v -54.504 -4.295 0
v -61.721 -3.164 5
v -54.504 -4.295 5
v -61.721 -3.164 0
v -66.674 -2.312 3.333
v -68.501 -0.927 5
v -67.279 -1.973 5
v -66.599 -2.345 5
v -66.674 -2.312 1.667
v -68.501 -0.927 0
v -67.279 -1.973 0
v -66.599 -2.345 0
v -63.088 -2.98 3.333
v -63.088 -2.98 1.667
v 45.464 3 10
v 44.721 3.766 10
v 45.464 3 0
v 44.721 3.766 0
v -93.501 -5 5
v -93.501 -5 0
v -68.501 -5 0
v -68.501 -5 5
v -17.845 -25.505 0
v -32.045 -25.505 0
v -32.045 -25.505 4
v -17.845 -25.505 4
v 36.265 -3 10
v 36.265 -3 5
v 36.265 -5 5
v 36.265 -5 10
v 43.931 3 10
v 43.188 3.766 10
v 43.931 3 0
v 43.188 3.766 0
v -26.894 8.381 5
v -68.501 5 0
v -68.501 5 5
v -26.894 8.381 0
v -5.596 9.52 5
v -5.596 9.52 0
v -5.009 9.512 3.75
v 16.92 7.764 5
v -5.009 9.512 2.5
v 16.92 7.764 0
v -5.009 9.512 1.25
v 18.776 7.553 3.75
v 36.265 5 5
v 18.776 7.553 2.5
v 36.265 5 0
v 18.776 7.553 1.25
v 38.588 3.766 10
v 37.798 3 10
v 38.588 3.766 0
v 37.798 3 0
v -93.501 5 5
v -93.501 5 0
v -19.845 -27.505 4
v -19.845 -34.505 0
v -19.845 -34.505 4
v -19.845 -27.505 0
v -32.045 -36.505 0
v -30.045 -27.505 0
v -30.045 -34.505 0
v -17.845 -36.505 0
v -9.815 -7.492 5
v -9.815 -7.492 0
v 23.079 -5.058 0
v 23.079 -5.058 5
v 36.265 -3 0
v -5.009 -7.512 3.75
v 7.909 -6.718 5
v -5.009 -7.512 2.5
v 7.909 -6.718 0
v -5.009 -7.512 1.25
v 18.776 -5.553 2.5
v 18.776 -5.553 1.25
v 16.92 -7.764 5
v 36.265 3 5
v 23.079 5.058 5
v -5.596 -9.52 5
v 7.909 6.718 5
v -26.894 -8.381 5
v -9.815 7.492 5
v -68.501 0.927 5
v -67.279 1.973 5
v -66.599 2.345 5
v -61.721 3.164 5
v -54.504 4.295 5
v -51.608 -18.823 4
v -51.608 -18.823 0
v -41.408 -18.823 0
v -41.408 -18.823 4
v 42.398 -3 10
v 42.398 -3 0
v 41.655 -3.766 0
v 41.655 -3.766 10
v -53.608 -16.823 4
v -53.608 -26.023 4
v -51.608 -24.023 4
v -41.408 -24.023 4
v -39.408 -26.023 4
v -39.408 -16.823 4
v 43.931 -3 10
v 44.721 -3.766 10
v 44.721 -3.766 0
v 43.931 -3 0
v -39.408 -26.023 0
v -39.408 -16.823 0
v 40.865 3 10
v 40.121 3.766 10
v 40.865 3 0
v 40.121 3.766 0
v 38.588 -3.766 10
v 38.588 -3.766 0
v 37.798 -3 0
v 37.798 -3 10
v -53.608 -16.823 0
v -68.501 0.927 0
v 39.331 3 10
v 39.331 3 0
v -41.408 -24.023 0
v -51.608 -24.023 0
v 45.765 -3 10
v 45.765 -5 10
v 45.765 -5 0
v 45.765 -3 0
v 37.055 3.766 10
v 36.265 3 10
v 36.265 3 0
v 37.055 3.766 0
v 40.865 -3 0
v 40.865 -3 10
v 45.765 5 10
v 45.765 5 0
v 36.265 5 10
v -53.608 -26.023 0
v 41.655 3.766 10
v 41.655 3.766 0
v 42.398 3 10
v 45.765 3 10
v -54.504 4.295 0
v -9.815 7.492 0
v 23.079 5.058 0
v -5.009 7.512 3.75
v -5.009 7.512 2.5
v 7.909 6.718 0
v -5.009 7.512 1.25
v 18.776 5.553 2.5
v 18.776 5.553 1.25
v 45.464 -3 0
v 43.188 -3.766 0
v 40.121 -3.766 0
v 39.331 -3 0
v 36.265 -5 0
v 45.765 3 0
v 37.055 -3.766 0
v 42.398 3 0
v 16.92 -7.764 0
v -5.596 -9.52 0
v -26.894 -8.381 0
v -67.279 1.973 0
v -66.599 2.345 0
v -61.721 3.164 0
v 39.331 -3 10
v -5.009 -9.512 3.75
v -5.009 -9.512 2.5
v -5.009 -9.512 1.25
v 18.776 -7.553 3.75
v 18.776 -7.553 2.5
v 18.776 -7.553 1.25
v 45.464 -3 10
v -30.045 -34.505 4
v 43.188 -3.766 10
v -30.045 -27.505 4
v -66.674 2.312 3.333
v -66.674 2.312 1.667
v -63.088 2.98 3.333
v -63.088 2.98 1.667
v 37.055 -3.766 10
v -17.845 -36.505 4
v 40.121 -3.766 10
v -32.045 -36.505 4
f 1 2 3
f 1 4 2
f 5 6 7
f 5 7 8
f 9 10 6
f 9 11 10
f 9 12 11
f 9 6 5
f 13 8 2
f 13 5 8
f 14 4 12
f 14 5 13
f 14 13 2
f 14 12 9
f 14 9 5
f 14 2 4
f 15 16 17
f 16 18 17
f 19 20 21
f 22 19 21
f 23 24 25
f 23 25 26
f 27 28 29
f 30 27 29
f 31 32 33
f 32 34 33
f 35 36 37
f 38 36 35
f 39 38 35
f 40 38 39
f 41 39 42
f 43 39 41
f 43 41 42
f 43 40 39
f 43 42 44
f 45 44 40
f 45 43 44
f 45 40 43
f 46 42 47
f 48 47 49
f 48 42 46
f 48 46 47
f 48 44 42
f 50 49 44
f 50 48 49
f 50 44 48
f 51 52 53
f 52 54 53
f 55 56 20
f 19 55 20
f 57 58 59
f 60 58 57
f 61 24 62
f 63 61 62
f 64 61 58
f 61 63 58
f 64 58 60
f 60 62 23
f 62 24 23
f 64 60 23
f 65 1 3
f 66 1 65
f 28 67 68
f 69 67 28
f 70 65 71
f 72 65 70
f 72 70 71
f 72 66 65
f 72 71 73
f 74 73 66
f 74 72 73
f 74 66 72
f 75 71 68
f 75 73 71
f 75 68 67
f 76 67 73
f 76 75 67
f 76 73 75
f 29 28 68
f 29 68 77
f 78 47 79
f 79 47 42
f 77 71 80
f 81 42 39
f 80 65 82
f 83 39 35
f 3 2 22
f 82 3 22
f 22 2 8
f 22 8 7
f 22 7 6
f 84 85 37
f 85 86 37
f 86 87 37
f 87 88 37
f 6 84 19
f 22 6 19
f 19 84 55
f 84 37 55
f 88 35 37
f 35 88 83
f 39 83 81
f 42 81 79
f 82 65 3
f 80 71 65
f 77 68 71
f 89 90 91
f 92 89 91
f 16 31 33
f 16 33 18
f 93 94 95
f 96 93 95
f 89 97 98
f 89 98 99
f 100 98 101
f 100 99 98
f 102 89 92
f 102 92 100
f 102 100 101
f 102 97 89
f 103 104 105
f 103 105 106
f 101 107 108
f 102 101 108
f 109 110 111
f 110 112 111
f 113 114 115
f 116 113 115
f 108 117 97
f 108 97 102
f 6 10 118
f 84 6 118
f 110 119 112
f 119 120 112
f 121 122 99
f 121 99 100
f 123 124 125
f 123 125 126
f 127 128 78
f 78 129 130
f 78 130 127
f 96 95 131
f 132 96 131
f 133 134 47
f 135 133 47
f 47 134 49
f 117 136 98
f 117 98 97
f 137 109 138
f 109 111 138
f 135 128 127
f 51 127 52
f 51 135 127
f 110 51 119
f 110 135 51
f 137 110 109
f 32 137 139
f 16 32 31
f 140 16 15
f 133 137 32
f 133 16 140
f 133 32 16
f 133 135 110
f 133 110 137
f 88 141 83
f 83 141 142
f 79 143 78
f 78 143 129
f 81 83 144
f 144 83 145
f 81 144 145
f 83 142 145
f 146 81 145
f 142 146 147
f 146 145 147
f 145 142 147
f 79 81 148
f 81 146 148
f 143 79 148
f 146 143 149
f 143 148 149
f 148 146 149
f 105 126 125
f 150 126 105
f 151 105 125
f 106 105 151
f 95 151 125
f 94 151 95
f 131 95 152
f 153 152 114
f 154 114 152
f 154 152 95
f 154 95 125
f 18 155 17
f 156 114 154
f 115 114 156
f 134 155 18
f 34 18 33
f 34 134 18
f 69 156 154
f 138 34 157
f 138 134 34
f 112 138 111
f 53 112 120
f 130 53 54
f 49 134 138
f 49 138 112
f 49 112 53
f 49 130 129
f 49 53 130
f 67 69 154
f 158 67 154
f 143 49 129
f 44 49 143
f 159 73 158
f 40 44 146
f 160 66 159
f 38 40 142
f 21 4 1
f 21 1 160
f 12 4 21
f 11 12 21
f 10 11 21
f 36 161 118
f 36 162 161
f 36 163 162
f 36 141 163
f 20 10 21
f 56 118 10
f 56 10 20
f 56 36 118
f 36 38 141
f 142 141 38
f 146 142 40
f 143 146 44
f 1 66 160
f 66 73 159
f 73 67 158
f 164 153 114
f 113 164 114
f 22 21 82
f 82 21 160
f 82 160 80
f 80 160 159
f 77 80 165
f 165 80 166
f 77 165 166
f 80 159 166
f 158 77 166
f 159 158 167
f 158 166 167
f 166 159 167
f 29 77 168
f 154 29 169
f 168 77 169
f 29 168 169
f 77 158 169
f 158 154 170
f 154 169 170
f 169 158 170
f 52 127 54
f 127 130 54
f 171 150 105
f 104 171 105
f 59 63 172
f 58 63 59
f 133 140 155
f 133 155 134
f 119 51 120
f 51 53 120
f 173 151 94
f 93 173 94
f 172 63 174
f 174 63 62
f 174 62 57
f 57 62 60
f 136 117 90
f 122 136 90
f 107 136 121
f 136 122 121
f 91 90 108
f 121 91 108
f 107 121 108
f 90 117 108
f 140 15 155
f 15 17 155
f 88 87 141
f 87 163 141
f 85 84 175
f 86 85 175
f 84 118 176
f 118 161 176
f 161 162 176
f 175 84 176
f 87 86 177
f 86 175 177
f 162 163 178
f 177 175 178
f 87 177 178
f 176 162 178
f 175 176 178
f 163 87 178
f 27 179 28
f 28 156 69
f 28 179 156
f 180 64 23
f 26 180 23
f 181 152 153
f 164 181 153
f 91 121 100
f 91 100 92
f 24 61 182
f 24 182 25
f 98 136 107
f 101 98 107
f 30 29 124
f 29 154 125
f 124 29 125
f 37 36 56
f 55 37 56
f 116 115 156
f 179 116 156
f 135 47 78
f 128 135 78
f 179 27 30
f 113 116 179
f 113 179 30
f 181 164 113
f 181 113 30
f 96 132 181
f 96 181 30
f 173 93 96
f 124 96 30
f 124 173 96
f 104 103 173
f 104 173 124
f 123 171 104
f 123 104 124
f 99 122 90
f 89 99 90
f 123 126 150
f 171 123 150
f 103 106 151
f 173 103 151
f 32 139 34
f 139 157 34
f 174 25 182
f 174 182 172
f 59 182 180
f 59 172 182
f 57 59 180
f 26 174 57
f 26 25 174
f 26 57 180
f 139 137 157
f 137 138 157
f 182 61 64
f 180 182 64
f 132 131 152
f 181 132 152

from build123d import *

# Parameters (mm, degrees)
F1_DEPTH = 5
F2_W     = 14.2
F2_H     = 9.2
F2_W_2   = 10.2
F2_H_2   = 5.2
F3_DEPTH = 4
F2_H_3   = 11
F2_H_4   = 7
F5_DEPTH = 5


with BuildPart() as f1:
    # F0 (on Top) → F1 (new body)
    with BuildSketch(Plane.XY):
        with BuildLine():
            add(Edge.make_bspline(
                [(-68.500610282, 5), (-54.2031592123, 6.498236069), (-28.9568536919, 8.0169149267), (-5.690111388, 10.3538383758), (18.7019701535, 7.5542384302), (30.7361740896, 6.1988411601), (36.2649820745, 5)],
                knots=[0, 0, 0, 0, 0.3124026076, 0.5516971774, 0.7926463097, 1, 1, 1, 1], degree=3))
            Line((-68.500610282, 5), (-93.500610282, 5))
            Line((-93.500610282, 5), (-93.500610282, -5))
            Line((-93.500610282, -5), (-68.500610282, -5))
            add(Edge.make_bspline(
                [(-68.500610282, -5), (-54.2031592123, -6.498236069), (-28.9568536919, -8.0169149267), (-5.690111388, -10.3538383758), (18.7019701535, -7.5542384302), (30.7361740896, -6.1988411601), (36.2649820745, -5)],
                knots=[0, 0, 0, 0, 0.3124026076, 0.5516971774, 0.7926463097, 1, 1, 1, 1], degree=3))
            Line((36.2649820745, -5), (45.7649820745, -5))
            Line((45.7649820745, -5), (45.7649820745, -3))
            Line((45.7649820745, -3), (45.4640649259, -3))
            Line((45.4640649259, -3), (44.7209854505, -3.7662296239))
            Line((44.7209854505, -3.7662296239), (43.9308844507, -3))
            Line((43.9308844507, -3), (43.1878049753, -3.7662296239))
            Line((43.1878049753, -3.7662296239), (42.3977039754, -3))
            Line((42.3977039754, -3), (41.6546245001, -3.7662296239))
            Line((41.6546245001, -3.7662296239), (40.8645235002, -3))
            Line((40.8645235002, -3), (40.1214440248, -3.7662296239))
            Line((40.1214440248, -3.7662296239), (39.331343025, -3))
            Line((39.331343025, -3), (38.5882635496, -3.7662296239))
            Line((38.5882635496, -3.7662296239), (37.7981625497, -3))
            Line((37.7981625497, -3), (37.0550830744, -3.7662296239))
            Line((37.0550830744, -3.7662296239), (36.2649820745, -3))
            add(Edge.make_bspline(
                [(-54.5035110722, -4.2945796628), (-45.1174188085, -5.0673920481), (-25.942247112, -6.3197035472), (-5.690111388, -8.3538383758), (18.7019701535, -5.5542384302), (30.7361740896, -4.1988411601), (36.2649820745, -3)],
                knots=[0.1027009604, 0.1027009604, 0.1027009604, 0.1027009604, 0.3124026076, 0.5516971774, 0.7926463097, 1, 1, 1, 1], degree=3))
            add(Edge.make_bspline(
                [(-68.500610282, -0.9273324395), (-67.9470667678, -1.4571608606), (-66.6954203062, -2.6607387972), (-62.7879440715, -2.9097150623), (-57.6365610628, -3.8172235663), (-54.5035110722, -4.2945796628)],
                knots=[0, 0, 0, 0, 0.23763899, 0.5374337196, 1, 1, 1, 1], degree=3))
            Line((-68.500610282, -0.9273324395), (-68.500610282, 0.9273324395))
            add(Edge.make_bspline(
                [(-68.500610282, 0.9273324395), (-67.9470667678, 1.4571608606), (-66.6954203062, 2.6607387972), (-62.7879440715, 2.9097150623), (-57.6365610628, 3.8172235663), (-54.5035110722, 4.2945796628)],
                knots=[0, 0, 0, 0, 0.23763899, 0.5374337196, 1, 1, 1, 1], degree=3))
            add(Edge.make_bspline(
                [(-54.5035110722, 4.2945796628), (-45.1174188085, 5.0673920481), (-25.942247112, 6.3197035472), (-5.690111388, 8.3538383758), (18.7019701535, 5.5542384302), (30.7361740896, 4.1988411601), (36.2649820745, 3)],
                knots=[0.1027009604, 0.1027009604, 0.1027009604, 0.1027009604, 0.3124026076, 0.5516971774, 0.7926463097, 1, 1, 1, 1], degree=3))
            Line((36.2649820745, 3), (37.0550830744, 3.7662296239))
            Line((37.0550830744, 3.7662296239), (37.7981625497, 3))
            Line((37.7981625497, 3), (38.5882635496, 3.7662296239))
            Line((38.5882635496, 3.7662296239), (39.331343025, 3))
            Line((39.331343025, 3), (40.1214440248, 3.7662296239))
            Line((40.1214440248, 3.7662296239), (40.8645235002, 3))
            Line((40.8645235002, 3), (41.6546245001, 3.7662296239))
            Line((41.6546245001, 3.7662296239), (42.3977039754, 3))
            Line((42.3977039754, 3), (43.1878049753, 3.7662296239))
            Line((43.1878049753, 3.7662296239), (43.9308844507, 3))
            Line((43.9308844507, 3), (44.7209854505, 3.7662296239))
            Line((44.7209854505, 3.7662296239), (45.4640649259, 3))
            Line((45.4640649259, 3), (45.7649820745, 3))
            Line((45.7649820745, 3), (45.7649820745, 5))
            Line((45.7649820745, 5), (36.2649820745, 5))
        make_face()
    extrude(amount=F1_DEPTH)

    # F4 (on face) → F5 (join)
    with BuildSketch(Plane.XY.offset(5)):
        Polygon((36.2649820745, 5), (36.2649820745, 3), (37.0550830744, 3.7662296239), (37.7981625497, 3), (38.5882635496, 3.7662296239), (39.331343025, 3), (40.1214440248, 3.7662296239), (40.8645235002, 3), (41.6546245001, 3.7662296239), (42.3977039754, 3), (43.1878049753, 3.7662296239), (43.9308844507, 3), (44.7209854505, 3.7662296239), (45.4640649259, 3), (45.7649820745, 3), (45.7649820745, 5), align=None)
        Polygon((37.0550830744, -3.7662296239), (36.2649820745, -3), (36.2649820745, -5), (45.7649820745, -5), (45.7649820745, -3), (45.4640649259, -3), (44.7209854505, -3.7662296239), (43.9308844507, -3), (43.1878049753, -3.7662296239), (42.3977039754, -3), (41.6546245001, -3.7662296239), (40.8645235002, -3), (40.1214440248, -3.7662296239), (39.331343025, -3), (38.5882635496, -3.7662296239), (37.7981625497, -3), align=None)
    extrude(amount=F5_DEPTH)


with BuildPart() as f3:
    # F2 (on Top) → F3 (new body)
    with BuildSketch(Plane.XY):
        with Locations((-46.5084100604, -21.4228421539)):
            Rectangle(F2_W, F2_H)
        with Locations((-46.5084100604, -21.4228421539)):
            Rectangle(F2_W_2, F2_H_2, mode=Mode.SUBTRACT)
    extrude(amount=F3_DEPTH)


with BuildPart() as f3b:
    # F2 (on Top) → F3, piece 2 (new body)
    with BuildSketch(Plane.XY):
        with Locations((-24.9447634608, -31.0053733885)):
            Rectangle(F2_W, F2_H_3)
        with Locations((-24.9447634608, -31.0053733885)):
            Rectangle(F2_W_2, F2_H_4, mode=Mode.SUBTRACT)
    extrude(amount=F3_DEPTH)


solid = Compound([f1.part, f3.part, f3b.part])
